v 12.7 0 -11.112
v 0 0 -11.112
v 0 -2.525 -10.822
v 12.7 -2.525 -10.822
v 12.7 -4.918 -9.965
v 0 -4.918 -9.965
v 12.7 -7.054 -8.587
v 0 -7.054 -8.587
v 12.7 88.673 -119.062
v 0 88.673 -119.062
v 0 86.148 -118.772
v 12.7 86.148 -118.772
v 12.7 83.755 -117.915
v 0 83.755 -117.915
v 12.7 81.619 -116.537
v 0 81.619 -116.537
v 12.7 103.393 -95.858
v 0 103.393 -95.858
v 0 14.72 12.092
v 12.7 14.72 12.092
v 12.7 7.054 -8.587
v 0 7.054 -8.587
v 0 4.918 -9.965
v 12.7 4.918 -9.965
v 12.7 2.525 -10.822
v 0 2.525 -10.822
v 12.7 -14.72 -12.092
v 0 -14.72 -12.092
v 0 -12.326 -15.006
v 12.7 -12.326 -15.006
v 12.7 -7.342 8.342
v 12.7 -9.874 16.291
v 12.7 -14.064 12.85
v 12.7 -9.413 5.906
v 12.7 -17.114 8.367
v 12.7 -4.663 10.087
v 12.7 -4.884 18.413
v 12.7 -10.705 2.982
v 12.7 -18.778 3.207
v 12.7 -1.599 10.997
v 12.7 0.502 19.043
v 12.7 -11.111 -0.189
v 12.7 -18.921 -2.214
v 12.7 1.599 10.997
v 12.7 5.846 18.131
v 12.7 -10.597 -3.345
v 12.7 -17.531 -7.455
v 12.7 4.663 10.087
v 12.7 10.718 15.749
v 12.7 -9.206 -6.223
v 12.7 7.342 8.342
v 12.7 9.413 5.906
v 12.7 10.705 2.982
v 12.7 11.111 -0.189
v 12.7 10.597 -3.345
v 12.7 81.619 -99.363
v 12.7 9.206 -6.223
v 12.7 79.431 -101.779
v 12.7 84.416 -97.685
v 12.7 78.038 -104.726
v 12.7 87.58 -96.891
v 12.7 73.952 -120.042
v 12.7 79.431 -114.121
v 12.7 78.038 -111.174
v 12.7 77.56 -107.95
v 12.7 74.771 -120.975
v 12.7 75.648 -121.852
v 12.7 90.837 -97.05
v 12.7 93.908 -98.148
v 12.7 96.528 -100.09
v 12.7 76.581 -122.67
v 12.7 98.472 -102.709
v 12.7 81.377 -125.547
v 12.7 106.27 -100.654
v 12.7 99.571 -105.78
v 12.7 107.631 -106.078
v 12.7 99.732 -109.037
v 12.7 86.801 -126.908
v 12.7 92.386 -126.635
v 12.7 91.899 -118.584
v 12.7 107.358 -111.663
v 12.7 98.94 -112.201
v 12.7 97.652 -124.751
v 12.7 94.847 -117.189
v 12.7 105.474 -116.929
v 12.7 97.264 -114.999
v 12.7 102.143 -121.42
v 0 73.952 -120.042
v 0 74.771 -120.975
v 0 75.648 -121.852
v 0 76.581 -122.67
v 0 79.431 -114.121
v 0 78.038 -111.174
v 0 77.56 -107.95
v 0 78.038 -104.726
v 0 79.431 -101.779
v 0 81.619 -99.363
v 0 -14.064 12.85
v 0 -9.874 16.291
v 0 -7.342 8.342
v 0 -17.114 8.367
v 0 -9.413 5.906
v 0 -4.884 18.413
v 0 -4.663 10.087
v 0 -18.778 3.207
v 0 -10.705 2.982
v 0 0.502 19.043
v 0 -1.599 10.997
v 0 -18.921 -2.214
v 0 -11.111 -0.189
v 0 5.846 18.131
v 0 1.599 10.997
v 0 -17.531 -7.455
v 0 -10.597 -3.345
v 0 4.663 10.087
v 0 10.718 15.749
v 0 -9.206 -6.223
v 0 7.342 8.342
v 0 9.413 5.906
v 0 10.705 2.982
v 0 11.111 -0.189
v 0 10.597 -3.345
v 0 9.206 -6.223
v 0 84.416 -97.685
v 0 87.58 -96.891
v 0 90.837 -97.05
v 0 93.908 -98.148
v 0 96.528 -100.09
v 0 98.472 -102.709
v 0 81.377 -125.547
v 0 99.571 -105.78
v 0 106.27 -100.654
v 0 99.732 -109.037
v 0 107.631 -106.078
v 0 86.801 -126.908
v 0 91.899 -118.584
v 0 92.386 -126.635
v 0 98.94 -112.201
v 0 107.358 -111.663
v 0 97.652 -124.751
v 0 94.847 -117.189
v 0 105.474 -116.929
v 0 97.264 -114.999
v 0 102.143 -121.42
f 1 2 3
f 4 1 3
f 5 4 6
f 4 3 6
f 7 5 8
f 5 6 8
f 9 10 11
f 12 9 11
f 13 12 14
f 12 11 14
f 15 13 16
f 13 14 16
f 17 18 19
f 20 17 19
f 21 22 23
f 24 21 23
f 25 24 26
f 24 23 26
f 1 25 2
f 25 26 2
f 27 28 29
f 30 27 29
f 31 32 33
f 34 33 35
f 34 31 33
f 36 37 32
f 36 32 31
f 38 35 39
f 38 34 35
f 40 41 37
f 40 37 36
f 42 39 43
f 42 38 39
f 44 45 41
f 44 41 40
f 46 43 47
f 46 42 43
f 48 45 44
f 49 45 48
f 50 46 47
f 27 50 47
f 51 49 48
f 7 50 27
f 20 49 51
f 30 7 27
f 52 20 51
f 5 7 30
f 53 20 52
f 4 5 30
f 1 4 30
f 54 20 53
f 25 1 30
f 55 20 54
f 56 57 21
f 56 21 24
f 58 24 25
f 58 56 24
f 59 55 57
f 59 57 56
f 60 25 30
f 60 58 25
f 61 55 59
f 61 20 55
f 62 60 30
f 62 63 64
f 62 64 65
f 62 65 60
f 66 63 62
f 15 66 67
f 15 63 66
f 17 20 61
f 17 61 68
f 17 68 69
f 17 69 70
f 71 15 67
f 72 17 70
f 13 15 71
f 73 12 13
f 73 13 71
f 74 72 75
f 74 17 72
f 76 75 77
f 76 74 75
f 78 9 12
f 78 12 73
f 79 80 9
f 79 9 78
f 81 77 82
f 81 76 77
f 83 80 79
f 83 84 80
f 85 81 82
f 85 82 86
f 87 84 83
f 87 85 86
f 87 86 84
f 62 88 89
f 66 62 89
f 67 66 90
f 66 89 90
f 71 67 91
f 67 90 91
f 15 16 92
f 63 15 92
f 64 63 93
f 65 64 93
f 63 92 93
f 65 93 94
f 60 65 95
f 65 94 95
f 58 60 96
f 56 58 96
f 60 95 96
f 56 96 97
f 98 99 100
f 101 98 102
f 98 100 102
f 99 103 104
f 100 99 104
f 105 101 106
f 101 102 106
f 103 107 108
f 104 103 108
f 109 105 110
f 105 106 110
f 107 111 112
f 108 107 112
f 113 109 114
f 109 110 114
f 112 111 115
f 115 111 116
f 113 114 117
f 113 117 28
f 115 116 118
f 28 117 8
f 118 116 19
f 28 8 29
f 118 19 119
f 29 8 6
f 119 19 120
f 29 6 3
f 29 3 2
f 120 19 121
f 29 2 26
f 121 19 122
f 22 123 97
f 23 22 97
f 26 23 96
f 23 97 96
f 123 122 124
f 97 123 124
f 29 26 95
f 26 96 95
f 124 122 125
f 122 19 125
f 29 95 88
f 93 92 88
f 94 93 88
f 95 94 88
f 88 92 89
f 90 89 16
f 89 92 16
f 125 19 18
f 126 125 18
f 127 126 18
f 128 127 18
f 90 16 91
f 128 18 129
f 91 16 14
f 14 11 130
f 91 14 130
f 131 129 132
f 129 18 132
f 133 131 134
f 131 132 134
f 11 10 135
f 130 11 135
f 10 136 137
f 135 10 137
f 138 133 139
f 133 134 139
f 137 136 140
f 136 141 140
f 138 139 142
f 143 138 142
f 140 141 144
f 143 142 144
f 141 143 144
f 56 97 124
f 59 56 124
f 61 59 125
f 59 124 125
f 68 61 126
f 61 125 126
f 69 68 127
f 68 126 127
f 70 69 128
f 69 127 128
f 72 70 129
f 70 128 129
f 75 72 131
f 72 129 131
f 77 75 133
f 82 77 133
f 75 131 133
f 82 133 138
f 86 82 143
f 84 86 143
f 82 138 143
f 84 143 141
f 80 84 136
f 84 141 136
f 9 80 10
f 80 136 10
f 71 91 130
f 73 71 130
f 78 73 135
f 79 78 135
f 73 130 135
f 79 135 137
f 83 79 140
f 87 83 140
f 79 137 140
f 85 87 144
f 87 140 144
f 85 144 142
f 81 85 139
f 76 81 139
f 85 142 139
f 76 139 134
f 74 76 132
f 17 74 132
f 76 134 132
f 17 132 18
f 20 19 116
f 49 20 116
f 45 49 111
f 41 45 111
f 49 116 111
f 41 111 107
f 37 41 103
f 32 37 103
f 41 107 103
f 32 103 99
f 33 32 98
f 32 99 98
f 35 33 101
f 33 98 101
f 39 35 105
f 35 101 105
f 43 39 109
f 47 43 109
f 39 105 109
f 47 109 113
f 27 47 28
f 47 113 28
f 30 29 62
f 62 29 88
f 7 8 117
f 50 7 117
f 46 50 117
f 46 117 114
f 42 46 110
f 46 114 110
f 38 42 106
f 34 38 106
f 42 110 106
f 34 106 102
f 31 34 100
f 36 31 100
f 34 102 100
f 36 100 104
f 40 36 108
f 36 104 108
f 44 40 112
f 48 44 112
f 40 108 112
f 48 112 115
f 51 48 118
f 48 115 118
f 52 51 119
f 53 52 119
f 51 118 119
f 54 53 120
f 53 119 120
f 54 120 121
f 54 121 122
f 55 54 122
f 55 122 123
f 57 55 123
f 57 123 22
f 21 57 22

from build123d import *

# Parameters (mm, degrees)
BOSS_EXTRUDE1_DEPTH = 12.7


with BuildPart() as part:
    # Sketch1 → Boss-Extrude1 (new body)
    with BuildSketch(Plane(origin=(0, 0, 0), x_dir=(0, 0, -1), z_dir=(1, 0, 0))):
        with BuildLine():
            ThreePointArc((8.586931818, -7.053528068), (-11.1125, 0), (8.586931818, 7.053528068))
            Line((8.586931818, 7.053528068), (99.363068182, 81.61939621))
            ThreePointArc((99.363068182, 81.61939621), (104.203977014, 99.134997115), (119.0625, 88.672924278))
            ThreePointArc((119.0625, 88.672924278), (118.412072837, 84.926901292), (116.536931818, 81.61939621))
            Line((116.536931818, 81.61939621), (122.670454545, 76.581161876))
            ThreePointArc((122.670454545, 76.581161876), (121.420384182, 102.14330846), (95.858237598, 103.393378823))
            Line((95.858237598, 103.393378823), (-12.091762402, 14.720454545))
            ThreePointArc((-12.091762402, 14.720454545), (-14.720454545, -12.091762402), (12.091762402, -14.720454545))
            Line((12.091762402, -14.720454545), (15.006187185, -12.326470588))
            Line((15.006187185, -12.326470588), (8.586931818, -7.053528068))
        make_face()
        with BuildLine():
            Line((99.363068182, 81.61939621), (8.586931818, 7.053528068))
            ThreePointArc((8.586931818, 7.053528068), (10.462072837, 3.746022986), (11.1125, 0))
            ThreePointArc((11.1125, 0), (10.462072837, -3.746022986), (8.586931818, -7.053528068))
            Line((8.586931818, -7.053528068), (15.006187185, -12.326470588))
            Line((15.006187185, -12.326470588), (120.041762402, 73.952469732))
            ThreePointArc((120.041762402, 73.952469732), (121.420384182, 75.202540096), (122.670454545, 76.581161876))
            Line((122.670454545, 76.581161876), (116.536931818, 81.61939621))
            ThreePointArc((116.536931818, 81.61939621), (107.95, 77.560424278), (99.363068182, 81.61939621))
        make_face()
    extrude(amount=BOSS_EXTRUDE1_DEPTH)


solid = part.part
